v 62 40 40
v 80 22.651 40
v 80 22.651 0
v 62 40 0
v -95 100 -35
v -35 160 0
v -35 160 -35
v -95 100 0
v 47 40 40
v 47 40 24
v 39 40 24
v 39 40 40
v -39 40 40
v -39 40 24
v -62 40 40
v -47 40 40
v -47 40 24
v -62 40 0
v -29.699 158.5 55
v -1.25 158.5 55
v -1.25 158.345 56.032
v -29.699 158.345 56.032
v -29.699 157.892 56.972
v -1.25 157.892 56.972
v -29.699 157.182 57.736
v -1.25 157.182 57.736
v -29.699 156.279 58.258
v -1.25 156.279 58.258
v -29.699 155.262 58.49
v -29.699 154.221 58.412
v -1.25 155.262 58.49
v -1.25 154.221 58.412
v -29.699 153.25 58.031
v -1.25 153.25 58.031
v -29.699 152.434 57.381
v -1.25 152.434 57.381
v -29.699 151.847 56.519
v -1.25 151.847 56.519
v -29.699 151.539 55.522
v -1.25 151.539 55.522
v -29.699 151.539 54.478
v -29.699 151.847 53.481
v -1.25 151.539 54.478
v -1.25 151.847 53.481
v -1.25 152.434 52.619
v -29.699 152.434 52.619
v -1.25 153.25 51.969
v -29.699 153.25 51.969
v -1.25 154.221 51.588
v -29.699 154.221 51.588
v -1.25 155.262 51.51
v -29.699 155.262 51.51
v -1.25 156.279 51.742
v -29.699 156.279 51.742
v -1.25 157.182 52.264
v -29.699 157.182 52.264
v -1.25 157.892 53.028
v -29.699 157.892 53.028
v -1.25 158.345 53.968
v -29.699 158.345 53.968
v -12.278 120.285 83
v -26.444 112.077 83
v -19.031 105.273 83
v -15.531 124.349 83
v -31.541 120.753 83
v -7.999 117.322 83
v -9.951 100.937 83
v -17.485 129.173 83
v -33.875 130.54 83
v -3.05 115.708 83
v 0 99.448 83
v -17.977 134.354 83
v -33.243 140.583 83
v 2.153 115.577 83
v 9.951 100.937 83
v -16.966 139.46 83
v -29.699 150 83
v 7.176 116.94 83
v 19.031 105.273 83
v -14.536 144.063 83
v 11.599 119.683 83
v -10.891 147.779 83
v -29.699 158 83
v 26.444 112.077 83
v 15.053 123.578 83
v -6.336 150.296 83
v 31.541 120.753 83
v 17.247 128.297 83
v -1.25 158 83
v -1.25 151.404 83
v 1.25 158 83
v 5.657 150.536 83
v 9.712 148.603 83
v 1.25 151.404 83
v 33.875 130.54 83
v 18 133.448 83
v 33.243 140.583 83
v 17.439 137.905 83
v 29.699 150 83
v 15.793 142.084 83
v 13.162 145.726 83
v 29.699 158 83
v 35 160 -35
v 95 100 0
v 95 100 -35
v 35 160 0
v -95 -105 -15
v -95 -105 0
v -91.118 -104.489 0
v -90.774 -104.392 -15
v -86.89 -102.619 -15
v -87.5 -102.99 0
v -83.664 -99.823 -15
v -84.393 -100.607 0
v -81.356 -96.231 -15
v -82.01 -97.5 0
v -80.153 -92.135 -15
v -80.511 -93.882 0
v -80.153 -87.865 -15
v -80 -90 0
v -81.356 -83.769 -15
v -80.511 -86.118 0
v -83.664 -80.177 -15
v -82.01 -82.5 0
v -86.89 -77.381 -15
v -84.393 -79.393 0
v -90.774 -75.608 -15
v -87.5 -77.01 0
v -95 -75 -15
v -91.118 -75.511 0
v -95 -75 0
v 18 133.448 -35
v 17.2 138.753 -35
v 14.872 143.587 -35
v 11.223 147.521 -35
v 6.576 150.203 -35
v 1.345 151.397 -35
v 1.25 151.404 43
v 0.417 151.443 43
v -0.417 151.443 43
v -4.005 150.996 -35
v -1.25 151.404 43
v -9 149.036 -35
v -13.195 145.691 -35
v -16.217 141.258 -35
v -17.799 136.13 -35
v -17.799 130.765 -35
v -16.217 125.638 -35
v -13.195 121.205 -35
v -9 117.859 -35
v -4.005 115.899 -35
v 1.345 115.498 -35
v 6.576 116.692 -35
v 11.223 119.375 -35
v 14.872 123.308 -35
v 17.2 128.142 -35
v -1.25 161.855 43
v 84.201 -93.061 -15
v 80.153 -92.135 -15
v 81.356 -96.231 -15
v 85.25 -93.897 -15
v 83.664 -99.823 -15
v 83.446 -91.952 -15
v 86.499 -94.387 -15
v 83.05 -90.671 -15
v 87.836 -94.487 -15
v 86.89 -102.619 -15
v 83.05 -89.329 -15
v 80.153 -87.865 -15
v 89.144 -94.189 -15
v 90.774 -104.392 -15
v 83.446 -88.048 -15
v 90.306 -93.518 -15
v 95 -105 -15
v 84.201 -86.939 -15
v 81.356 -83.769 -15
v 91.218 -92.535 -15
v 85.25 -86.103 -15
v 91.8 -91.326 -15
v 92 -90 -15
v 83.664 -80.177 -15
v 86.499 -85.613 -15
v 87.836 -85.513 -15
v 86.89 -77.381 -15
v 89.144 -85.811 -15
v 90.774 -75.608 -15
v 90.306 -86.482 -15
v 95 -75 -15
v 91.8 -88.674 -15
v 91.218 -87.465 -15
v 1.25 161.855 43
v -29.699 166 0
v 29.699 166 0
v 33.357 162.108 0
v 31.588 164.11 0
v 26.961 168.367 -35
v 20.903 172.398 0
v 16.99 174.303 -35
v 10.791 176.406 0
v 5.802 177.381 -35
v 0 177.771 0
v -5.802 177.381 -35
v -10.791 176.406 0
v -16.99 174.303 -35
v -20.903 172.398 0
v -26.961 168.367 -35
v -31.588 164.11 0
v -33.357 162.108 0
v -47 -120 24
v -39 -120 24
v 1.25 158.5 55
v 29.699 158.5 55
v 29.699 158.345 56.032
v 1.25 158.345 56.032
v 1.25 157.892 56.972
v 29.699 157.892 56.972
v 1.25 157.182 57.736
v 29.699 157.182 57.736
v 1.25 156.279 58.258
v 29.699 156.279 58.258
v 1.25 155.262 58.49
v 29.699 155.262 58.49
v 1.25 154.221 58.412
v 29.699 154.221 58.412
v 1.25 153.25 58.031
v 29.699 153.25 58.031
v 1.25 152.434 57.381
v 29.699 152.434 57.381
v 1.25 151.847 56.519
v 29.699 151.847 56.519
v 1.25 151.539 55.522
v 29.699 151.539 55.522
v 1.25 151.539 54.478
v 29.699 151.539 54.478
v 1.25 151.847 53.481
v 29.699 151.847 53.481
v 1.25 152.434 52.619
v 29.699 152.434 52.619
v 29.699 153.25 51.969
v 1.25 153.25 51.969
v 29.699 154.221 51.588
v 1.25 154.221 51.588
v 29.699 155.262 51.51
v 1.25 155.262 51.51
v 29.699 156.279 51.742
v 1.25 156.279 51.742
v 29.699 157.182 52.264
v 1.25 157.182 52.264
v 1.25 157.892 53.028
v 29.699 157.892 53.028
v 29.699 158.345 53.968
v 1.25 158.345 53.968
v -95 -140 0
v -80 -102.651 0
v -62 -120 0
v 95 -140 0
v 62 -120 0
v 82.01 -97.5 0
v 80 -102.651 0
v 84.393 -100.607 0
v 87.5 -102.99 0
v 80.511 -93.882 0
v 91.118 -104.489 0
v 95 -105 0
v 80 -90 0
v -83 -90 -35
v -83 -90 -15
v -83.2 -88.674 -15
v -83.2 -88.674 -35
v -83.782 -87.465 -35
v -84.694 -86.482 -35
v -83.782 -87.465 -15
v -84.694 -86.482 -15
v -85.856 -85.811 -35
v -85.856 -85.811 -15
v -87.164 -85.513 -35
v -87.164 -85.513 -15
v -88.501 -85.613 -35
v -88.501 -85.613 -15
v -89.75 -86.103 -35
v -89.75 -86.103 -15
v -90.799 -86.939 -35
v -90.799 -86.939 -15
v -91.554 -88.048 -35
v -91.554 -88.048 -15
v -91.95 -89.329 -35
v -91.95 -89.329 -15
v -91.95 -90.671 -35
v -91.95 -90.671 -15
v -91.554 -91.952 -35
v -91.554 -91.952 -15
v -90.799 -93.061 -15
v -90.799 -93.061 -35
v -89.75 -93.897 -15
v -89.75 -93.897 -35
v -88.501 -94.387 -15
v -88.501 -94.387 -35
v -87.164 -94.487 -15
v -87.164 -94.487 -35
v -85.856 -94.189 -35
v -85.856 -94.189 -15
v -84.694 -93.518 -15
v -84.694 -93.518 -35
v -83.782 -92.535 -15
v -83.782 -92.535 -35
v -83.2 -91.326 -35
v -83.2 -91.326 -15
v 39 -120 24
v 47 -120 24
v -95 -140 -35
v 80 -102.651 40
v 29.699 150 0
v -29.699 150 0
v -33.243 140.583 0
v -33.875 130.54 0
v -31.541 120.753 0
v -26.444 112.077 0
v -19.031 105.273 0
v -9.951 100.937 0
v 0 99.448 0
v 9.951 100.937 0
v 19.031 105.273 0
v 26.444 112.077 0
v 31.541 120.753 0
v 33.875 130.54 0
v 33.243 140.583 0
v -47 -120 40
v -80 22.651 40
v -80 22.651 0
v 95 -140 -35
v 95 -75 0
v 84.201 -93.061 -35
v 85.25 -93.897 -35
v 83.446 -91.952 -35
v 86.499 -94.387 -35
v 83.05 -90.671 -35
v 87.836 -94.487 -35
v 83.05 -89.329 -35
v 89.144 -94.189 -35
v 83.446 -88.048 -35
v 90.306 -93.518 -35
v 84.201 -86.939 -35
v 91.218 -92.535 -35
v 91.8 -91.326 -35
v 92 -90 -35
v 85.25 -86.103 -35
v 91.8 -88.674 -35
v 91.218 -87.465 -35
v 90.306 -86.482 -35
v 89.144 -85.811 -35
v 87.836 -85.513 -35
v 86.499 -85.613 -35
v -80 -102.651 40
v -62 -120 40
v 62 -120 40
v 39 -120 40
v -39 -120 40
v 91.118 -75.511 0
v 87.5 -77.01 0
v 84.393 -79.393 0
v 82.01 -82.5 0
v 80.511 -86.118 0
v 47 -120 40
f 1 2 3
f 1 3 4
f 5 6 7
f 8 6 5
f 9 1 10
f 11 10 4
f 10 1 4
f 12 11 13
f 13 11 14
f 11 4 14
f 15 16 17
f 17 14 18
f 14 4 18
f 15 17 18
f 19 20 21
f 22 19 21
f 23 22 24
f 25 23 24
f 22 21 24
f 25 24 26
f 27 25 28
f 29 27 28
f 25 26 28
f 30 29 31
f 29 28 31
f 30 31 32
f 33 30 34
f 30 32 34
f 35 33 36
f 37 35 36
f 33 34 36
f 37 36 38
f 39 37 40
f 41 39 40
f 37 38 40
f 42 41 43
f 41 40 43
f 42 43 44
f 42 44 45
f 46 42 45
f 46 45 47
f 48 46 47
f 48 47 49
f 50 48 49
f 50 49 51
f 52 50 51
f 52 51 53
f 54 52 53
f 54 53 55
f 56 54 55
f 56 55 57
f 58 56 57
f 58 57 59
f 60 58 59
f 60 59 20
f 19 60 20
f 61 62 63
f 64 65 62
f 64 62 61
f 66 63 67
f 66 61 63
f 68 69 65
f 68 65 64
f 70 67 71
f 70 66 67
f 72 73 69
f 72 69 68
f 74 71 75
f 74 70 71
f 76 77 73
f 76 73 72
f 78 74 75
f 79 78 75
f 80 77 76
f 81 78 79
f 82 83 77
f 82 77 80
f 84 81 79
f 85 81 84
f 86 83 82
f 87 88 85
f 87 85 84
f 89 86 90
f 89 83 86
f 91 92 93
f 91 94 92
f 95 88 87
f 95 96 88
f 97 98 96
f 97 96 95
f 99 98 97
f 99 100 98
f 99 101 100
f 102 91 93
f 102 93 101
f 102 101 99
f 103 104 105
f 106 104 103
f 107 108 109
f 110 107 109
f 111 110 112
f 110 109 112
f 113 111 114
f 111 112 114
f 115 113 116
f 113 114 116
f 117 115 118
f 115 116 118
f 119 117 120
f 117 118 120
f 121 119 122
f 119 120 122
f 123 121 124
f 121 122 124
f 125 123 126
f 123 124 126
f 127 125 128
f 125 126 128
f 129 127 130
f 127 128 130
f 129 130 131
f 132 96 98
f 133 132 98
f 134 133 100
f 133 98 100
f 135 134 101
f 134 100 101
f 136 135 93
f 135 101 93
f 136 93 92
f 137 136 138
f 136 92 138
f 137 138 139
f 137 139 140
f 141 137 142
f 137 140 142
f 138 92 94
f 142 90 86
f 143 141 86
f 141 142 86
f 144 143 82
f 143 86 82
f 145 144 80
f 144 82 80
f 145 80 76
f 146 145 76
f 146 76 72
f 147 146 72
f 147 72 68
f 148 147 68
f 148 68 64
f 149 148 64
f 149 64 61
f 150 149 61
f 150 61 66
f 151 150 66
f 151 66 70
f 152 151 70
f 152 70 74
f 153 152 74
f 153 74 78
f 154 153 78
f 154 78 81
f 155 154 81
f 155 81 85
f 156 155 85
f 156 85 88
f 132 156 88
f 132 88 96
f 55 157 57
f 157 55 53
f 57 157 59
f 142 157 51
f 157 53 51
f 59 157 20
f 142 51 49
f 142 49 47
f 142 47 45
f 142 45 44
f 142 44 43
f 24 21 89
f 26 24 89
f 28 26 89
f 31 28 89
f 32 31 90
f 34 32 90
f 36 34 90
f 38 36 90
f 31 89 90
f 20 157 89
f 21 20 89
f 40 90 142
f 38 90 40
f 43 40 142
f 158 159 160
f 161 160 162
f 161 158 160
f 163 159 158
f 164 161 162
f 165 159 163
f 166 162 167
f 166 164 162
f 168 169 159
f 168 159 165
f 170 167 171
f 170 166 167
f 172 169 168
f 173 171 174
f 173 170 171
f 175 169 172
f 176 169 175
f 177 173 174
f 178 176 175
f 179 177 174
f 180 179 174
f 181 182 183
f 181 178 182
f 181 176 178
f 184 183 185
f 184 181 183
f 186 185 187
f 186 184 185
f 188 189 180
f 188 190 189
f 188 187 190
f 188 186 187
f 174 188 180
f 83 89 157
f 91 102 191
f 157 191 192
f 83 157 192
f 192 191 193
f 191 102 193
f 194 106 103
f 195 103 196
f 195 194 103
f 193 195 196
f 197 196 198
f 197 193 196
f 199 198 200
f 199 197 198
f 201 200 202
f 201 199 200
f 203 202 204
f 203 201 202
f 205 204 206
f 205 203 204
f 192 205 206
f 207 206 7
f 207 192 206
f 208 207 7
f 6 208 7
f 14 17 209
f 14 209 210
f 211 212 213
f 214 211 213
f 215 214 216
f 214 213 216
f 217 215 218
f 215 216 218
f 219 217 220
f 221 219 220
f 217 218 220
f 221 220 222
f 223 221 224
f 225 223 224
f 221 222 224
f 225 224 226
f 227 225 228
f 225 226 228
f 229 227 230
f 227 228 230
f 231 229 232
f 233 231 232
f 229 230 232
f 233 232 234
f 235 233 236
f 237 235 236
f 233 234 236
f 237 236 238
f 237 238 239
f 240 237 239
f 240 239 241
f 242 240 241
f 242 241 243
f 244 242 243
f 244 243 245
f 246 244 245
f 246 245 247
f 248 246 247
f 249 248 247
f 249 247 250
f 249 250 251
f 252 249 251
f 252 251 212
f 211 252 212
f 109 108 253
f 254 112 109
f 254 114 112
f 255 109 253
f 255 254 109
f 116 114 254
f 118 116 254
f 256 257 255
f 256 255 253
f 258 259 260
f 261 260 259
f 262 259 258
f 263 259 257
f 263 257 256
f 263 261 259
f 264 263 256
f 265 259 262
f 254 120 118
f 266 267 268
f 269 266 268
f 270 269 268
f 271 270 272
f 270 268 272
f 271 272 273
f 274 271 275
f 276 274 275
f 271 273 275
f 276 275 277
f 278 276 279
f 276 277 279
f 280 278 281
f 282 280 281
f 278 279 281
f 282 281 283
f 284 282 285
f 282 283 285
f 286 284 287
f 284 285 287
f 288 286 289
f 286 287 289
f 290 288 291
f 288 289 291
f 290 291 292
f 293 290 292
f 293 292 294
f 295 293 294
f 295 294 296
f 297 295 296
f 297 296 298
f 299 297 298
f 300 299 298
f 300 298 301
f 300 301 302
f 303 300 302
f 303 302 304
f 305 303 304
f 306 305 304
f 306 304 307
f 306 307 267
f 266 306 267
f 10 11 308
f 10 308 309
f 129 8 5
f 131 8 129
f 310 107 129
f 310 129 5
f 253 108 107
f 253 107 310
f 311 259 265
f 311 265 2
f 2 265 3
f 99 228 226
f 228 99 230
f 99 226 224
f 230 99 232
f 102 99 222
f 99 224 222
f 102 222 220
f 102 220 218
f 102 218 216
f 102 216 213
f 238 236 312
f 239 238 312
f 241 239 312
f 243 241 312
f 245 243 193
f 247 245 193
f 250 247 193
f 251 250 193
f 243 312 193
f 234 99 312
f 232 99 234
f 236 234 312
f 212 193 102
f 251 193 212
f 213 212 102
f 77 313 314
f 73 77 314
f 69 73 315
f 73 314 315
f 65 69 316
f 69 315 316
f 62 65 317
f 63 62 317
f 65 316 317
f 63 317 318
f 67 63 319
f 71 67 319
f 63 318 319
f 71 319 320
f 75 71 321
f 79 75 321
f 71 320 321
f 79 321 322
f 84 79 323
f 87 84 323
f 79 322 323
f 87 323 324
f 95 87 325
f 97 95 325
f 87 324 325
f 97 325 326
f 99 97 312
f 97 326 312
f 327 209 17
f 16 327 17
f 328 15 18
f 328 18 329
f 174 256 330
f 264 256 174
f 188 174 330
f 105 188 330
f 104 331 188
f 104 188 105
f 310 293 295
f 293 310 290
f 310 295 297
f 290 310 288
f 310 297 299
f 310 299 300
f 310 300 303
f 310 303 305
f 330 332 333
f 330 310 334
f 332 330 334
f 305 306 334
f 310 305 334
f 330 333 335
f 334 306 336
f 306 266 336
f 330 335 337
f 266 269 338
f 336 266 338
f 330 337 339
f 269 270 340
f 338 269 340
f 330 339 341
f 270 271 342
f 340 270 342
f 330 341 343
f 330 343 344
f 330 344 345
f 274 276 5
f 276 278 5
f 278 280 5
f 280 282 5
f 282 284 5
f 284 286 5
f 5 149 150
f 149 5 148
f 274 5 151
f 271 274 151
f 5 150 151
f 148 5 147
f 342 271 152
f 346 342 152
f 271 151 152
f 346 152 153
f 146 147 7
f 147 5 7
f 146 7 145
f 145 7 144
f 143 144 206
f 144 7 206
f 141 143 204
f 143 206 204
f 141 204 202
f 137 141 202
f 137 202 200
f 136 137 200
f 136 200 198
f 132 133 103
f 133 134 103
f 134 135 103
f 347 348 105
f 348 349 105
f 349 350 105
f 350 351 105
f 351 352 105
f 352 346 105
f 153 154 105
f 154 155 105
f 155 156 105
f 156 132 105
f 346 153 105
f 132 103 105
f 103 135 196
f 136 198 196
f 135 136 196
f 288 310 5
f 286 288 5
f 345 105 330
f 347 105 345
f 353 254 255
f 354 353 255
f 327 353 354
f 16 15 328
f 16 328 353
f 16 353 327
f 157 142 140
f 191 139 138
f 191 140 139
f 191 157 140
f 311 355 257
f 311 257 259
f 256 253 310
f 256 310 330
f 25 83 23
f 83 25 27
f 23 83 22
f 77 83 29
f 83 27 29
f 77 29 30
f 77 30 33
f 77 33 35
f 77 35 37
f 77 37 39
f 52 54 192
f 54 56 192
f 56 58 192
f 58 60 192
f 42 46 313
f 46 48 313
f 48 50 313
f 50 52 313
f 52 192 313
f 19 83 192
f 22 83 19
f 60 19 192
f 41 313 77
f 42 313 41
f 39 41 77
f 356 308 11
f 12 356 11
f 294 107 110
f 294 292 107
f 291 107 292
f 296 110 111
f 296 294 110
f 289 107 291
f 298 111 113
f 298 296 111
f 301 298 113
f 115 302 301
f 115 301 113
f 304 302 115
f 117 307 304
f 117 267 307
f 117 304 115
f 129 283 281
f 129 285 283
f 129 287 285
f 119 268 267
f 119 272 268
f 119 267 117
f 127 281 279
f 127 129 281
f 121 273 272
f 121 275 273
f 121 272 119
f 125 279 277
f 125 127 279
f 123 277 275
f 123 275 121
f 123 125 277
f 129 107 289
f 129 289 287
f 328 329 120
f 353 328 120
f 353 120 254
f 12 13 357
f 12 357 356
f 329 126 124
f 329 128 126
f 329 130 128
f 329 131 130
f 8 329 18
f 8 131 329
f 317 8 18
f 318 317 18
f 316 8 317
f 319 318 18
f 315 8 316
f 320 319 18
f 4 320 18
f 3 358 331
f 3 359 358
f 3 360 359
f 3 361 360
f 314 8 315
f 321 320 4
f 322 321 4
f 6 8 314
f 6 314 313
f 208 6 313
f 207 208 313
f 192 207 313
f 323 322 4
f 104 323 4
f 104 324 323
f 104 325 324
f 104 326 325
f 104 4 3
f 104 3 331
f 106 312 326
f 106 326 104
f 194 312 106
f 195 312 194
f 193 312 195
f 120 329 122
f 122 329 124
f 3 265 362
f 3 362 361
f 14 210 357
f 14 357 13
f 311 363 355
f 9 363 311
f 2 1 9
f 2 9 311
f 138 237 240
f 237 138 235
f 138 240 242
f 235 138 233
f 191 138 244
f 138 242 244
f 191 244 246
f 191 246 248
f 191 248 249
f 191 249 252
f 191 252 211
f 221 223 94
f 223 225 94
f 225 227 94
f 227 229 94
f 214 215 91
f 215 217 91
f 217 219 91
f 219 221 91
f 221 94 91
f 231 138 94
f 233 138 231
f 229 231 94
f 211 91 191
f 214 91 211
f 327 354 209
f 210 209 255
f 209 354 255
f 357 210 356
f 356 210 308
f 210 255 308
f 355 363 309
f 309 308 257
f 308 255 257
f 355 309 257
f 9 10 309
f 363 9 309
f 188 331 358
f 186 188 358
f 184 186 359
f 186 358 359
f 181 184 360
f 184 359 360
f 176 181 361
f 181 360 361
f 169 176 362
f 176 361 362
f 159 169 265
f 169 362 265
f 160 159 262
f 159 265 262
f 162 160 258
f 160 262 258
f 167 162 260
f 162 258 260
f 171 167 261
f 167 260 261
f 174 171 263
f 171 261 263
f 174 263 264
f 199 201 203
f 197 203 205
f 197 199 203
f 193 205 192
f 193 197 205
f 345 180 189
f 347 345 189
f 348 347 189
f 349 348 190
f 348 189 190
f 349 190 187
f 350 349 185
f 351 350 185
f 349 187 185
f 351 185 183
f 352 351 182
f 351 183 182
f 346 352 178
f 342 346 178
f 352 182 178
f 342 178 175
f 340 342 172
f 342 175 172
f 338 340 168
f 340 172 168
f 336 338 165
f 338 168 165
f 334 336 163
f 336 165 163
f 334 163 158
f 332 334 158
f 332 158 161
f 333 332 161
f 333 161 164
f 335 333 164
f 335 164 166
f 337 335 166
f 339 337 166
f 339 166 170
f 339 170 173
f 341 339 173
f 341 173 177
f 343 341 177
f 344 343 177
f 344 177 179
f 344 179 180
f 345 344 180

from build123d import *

# Parameters (mm, degrees)
F0_R      = 4.5
F1_DEPTH  = 35
F2_DEPTH  = 24
F3_DEPTH  = 15
F5_DEPTH  = 35
F7_DEPTH  = 83
F9_DEPTH  = 125
F10_R     = 18
F11_DEPTH = 222
F12_W     = 2.5
F12_H     = 32
F13_DEPTH = 40
F8_R      = 3.5
F14_DEPTH = 94.3
F15_W     = 78
F15_H     = 160
F16_DEPTH = 16
F17_DEPTH = 24


with BuildPart() as f1:
    # F0 (on Top) → F1 (new body)
    with BuildSketch(Plane.XY):
        with BuildLine():
            Line((35, 160), (-35, 160))
            Line((-35, 160), (-95, 100))
            Line((-95, 100), (-95, -75))
            ThreePointArc((-95, -75), (-84.3933982822, -79.3933982822), (-80, -90))
            Line((-80, -90), (-80, 40))
            Line((-80, 40), (80, 40))
            Line((80, 40), (80, -90))
            ThreePointArc((80, -90), (84.3933982822, -79.3933982822), (95, -75))
            Line((95, -75), (95, 100))
            Line((95, 100), (35, 160))
        make_face()
        Polygon((-80, 40), (-80, -90), (-80, -120), (80, -120), (80, -90), (80, 40), align=None)
        with BuildLine():
            ThreePointArc((-80, -90), (-84.3933982822, -100.6066017178), (-95, -105))
            Line((-95, -105), (-95, -140))
            Line((-95, -140), (95, -140))
            Line((95, -140), (95, -105))
            ThreePointArc((95, -105), (84.3933982822, -100.6066017178), (80, -90))
            Line((80, -90), (80, -120))
            Line((80, -120), (-80, -120))
            Line((-80, -120), (-80, -90))
        make_face()
        with BuildLine():
            Line((95, -105), (95, -75))
            ThreePointArc((95, -75), (84.3933982822, -79.3933982822), (80, -90))
            ThreePointArc((80, -90), (84.3933982822, -100.6066017178), (95, -105))
        make_face()
        with Locations((87.5, -90)):
            Circle(F0_R, mode=Mode.SUBTRACT)
        with BuildLine():
            ThreePointArc((-80, -90), (-84.3933982822, -79.3933982822), (-95, -75))
            Line((-95, -75), (-95, -105))
            ThreePointArc((-95, -105), (-84.3933982822, -100.6066017178), (-80, -90))
        make_face()
        with Locations((-87.5, -90)):
            Circle(F0_R, mode=Mode.SUBTRACT)
    extrude(amount=-F1_DEPTH)

    # F0 (on Top) → F2 (join)
    with BuildSketch(Plane.XY):
        Polygon((-80, 40), (-80, -90), (-80, -120), (80, -120), (80, -90), (80, 40), align=None)
    extrude(amount=F2_DEPTH)

    # F0 (on Top) → F3 (cut)
    with BuildSketch(Plane.XY):
        with BuildLine():
            ThreePointArc((-80, -90), (-84.3933982822, -79.3933982822), (-95, -75))
            Line((-95, -75), (-95, -105))
            ThreePointArc((-95, -105), (-84.3933982822, -100.6066017178), (-80, -90))
        make_face()
        with Locations((-87.5, -90)):
            Circle(F0_R, mode=Mode.SUBTRACT)
        with BuildLine():
            Line((95, -105), (95, -75))
            ThreePointArc((95, -75), (84.3933982822, -79.3933982822), (80, -90))
            ThreePointArc((80, -90), (84.3933982822, -100.6066017178), (95, -105))
        make_face()
        with Locations((87.5, -90)):
            Circle(F0_R, mode=Mode.SUBTRACT)
    extrude(amount=-F3_DEPTH, mode=Mode.SUBTRACT)

    # F4 (on face) → F5 (join)
    with BuildSketch(Plane.XY):
        with BuildLine():
            Line((-35, 160), (35, 160))
            ThreePointArc((35, 160), (0, 177.7706570637), (-35, 160))
        make_face()
    extrude(amount=-F5_DEPTH)

    # F6 (on face) → F7 (join)
    with BuildSketch(Plane.XY):
        with BuildLine():
            Line((29.6988346186, 166), (-29.6988346186, 166))
            Line((-29.6988346186, 166), (-29.6988346186, 150))
            ThreePointArc((-29.6988346186, 150), (0, 99.4476822681), (29.6988346186, 150))
            Line((29.6988346186, 150), (29.6988346186, 166))
        make_face()
    extrude(amount=F7_DEPTH)

    # F8 (on face) → F9 (cut)
    with BuildSketch(Plane.YZ.offset(29.6988346186)):
        Polygon((158, 83), (166, 0), (166, 83), align=None)
    extrude(amount=-F9_DEPTH, mode=Mode.SUBTRACT)

    # F10 (on face) → F11 (cut)
    with BuildSketch(Plane.XY.offset(83)):
        with Locations((0, 133.4476822681)):
            Circle(F10_R)
    extrude(amount=-F11_DEPTH, mode=Mode.SUBTRACT)

    # F12 (on face) → F13 (cut)
    with BuildSketch(Plane.XY.offset(83)):
        with Locations((0, 174)):
            Rectangle(F12_W, F12_H)
        with BuildLine():
            Line((1.25, 158), (-1.25, 158))
            Line((-1.25, 158), (-1.25, 151.404227036))
            ThreePointArc((-1.25, 151.404227036), (0, 151.4476822681), (1.25, 151.404227036))
            Line((1.25, 151.404227036), (1.25, 158))
        make_face()
        with BuildLine():
            ThreePointArc((1.25, 151.404227036), (0, 151.4476822681), (-1.25, 151.404227036))
            Line((-1.25, 151.404227036), (-1.25, 140))
            Line((-1.25, 140), (1.25, 140))
            Line((1.25, 140), (1.25, 151.404227036))
        make_face()
    extrude(amount=-F13_DEPTH, mode=Mode.SUBTRACT)

    # F8 (on face) → F14 (cut)
    with BuildSketch(Plane.YZ.offset(29.6988346186)):
        with Locations((155, 55)):
            Circle(F8_R)
    extrude(amount=-F14_DEPTH, mode=Mode.SUBTRACT)

    # F15 (on face) → F16 (join)
    with BuildSketch(Plane.XY.offset(24)):
        Polygon((62, 40), (47, 40), (47, -120), (62, -120), (80, -102.6506484271), (80, 22.6506484271), align=None)
        with Locations((0, -40)):
            Rectangle(F15_W, F15_H)
        Polygon((-47, -120), (-47, 40), (-62, 40), (-80, 22.6506484271), (-80, -102.6506484271), (-62, -120), align=None)
    extrude(amount=F16_DEPTH)

    # F17 (cut): faces of the model
    f17_faces = [f1.faces().sort_by_distance(p)[0] for p in [
        (-74, 34.216882809, 24),
        (-74, -114.216882809, 24),
        (74, -114.216882809, 24),
        (74, 34.216882809, 24),
    ]]
    extrude(f17_faces, amount=-F17_DEPTH, mode=Mode.SUBTRACT)


solid = f1.part
